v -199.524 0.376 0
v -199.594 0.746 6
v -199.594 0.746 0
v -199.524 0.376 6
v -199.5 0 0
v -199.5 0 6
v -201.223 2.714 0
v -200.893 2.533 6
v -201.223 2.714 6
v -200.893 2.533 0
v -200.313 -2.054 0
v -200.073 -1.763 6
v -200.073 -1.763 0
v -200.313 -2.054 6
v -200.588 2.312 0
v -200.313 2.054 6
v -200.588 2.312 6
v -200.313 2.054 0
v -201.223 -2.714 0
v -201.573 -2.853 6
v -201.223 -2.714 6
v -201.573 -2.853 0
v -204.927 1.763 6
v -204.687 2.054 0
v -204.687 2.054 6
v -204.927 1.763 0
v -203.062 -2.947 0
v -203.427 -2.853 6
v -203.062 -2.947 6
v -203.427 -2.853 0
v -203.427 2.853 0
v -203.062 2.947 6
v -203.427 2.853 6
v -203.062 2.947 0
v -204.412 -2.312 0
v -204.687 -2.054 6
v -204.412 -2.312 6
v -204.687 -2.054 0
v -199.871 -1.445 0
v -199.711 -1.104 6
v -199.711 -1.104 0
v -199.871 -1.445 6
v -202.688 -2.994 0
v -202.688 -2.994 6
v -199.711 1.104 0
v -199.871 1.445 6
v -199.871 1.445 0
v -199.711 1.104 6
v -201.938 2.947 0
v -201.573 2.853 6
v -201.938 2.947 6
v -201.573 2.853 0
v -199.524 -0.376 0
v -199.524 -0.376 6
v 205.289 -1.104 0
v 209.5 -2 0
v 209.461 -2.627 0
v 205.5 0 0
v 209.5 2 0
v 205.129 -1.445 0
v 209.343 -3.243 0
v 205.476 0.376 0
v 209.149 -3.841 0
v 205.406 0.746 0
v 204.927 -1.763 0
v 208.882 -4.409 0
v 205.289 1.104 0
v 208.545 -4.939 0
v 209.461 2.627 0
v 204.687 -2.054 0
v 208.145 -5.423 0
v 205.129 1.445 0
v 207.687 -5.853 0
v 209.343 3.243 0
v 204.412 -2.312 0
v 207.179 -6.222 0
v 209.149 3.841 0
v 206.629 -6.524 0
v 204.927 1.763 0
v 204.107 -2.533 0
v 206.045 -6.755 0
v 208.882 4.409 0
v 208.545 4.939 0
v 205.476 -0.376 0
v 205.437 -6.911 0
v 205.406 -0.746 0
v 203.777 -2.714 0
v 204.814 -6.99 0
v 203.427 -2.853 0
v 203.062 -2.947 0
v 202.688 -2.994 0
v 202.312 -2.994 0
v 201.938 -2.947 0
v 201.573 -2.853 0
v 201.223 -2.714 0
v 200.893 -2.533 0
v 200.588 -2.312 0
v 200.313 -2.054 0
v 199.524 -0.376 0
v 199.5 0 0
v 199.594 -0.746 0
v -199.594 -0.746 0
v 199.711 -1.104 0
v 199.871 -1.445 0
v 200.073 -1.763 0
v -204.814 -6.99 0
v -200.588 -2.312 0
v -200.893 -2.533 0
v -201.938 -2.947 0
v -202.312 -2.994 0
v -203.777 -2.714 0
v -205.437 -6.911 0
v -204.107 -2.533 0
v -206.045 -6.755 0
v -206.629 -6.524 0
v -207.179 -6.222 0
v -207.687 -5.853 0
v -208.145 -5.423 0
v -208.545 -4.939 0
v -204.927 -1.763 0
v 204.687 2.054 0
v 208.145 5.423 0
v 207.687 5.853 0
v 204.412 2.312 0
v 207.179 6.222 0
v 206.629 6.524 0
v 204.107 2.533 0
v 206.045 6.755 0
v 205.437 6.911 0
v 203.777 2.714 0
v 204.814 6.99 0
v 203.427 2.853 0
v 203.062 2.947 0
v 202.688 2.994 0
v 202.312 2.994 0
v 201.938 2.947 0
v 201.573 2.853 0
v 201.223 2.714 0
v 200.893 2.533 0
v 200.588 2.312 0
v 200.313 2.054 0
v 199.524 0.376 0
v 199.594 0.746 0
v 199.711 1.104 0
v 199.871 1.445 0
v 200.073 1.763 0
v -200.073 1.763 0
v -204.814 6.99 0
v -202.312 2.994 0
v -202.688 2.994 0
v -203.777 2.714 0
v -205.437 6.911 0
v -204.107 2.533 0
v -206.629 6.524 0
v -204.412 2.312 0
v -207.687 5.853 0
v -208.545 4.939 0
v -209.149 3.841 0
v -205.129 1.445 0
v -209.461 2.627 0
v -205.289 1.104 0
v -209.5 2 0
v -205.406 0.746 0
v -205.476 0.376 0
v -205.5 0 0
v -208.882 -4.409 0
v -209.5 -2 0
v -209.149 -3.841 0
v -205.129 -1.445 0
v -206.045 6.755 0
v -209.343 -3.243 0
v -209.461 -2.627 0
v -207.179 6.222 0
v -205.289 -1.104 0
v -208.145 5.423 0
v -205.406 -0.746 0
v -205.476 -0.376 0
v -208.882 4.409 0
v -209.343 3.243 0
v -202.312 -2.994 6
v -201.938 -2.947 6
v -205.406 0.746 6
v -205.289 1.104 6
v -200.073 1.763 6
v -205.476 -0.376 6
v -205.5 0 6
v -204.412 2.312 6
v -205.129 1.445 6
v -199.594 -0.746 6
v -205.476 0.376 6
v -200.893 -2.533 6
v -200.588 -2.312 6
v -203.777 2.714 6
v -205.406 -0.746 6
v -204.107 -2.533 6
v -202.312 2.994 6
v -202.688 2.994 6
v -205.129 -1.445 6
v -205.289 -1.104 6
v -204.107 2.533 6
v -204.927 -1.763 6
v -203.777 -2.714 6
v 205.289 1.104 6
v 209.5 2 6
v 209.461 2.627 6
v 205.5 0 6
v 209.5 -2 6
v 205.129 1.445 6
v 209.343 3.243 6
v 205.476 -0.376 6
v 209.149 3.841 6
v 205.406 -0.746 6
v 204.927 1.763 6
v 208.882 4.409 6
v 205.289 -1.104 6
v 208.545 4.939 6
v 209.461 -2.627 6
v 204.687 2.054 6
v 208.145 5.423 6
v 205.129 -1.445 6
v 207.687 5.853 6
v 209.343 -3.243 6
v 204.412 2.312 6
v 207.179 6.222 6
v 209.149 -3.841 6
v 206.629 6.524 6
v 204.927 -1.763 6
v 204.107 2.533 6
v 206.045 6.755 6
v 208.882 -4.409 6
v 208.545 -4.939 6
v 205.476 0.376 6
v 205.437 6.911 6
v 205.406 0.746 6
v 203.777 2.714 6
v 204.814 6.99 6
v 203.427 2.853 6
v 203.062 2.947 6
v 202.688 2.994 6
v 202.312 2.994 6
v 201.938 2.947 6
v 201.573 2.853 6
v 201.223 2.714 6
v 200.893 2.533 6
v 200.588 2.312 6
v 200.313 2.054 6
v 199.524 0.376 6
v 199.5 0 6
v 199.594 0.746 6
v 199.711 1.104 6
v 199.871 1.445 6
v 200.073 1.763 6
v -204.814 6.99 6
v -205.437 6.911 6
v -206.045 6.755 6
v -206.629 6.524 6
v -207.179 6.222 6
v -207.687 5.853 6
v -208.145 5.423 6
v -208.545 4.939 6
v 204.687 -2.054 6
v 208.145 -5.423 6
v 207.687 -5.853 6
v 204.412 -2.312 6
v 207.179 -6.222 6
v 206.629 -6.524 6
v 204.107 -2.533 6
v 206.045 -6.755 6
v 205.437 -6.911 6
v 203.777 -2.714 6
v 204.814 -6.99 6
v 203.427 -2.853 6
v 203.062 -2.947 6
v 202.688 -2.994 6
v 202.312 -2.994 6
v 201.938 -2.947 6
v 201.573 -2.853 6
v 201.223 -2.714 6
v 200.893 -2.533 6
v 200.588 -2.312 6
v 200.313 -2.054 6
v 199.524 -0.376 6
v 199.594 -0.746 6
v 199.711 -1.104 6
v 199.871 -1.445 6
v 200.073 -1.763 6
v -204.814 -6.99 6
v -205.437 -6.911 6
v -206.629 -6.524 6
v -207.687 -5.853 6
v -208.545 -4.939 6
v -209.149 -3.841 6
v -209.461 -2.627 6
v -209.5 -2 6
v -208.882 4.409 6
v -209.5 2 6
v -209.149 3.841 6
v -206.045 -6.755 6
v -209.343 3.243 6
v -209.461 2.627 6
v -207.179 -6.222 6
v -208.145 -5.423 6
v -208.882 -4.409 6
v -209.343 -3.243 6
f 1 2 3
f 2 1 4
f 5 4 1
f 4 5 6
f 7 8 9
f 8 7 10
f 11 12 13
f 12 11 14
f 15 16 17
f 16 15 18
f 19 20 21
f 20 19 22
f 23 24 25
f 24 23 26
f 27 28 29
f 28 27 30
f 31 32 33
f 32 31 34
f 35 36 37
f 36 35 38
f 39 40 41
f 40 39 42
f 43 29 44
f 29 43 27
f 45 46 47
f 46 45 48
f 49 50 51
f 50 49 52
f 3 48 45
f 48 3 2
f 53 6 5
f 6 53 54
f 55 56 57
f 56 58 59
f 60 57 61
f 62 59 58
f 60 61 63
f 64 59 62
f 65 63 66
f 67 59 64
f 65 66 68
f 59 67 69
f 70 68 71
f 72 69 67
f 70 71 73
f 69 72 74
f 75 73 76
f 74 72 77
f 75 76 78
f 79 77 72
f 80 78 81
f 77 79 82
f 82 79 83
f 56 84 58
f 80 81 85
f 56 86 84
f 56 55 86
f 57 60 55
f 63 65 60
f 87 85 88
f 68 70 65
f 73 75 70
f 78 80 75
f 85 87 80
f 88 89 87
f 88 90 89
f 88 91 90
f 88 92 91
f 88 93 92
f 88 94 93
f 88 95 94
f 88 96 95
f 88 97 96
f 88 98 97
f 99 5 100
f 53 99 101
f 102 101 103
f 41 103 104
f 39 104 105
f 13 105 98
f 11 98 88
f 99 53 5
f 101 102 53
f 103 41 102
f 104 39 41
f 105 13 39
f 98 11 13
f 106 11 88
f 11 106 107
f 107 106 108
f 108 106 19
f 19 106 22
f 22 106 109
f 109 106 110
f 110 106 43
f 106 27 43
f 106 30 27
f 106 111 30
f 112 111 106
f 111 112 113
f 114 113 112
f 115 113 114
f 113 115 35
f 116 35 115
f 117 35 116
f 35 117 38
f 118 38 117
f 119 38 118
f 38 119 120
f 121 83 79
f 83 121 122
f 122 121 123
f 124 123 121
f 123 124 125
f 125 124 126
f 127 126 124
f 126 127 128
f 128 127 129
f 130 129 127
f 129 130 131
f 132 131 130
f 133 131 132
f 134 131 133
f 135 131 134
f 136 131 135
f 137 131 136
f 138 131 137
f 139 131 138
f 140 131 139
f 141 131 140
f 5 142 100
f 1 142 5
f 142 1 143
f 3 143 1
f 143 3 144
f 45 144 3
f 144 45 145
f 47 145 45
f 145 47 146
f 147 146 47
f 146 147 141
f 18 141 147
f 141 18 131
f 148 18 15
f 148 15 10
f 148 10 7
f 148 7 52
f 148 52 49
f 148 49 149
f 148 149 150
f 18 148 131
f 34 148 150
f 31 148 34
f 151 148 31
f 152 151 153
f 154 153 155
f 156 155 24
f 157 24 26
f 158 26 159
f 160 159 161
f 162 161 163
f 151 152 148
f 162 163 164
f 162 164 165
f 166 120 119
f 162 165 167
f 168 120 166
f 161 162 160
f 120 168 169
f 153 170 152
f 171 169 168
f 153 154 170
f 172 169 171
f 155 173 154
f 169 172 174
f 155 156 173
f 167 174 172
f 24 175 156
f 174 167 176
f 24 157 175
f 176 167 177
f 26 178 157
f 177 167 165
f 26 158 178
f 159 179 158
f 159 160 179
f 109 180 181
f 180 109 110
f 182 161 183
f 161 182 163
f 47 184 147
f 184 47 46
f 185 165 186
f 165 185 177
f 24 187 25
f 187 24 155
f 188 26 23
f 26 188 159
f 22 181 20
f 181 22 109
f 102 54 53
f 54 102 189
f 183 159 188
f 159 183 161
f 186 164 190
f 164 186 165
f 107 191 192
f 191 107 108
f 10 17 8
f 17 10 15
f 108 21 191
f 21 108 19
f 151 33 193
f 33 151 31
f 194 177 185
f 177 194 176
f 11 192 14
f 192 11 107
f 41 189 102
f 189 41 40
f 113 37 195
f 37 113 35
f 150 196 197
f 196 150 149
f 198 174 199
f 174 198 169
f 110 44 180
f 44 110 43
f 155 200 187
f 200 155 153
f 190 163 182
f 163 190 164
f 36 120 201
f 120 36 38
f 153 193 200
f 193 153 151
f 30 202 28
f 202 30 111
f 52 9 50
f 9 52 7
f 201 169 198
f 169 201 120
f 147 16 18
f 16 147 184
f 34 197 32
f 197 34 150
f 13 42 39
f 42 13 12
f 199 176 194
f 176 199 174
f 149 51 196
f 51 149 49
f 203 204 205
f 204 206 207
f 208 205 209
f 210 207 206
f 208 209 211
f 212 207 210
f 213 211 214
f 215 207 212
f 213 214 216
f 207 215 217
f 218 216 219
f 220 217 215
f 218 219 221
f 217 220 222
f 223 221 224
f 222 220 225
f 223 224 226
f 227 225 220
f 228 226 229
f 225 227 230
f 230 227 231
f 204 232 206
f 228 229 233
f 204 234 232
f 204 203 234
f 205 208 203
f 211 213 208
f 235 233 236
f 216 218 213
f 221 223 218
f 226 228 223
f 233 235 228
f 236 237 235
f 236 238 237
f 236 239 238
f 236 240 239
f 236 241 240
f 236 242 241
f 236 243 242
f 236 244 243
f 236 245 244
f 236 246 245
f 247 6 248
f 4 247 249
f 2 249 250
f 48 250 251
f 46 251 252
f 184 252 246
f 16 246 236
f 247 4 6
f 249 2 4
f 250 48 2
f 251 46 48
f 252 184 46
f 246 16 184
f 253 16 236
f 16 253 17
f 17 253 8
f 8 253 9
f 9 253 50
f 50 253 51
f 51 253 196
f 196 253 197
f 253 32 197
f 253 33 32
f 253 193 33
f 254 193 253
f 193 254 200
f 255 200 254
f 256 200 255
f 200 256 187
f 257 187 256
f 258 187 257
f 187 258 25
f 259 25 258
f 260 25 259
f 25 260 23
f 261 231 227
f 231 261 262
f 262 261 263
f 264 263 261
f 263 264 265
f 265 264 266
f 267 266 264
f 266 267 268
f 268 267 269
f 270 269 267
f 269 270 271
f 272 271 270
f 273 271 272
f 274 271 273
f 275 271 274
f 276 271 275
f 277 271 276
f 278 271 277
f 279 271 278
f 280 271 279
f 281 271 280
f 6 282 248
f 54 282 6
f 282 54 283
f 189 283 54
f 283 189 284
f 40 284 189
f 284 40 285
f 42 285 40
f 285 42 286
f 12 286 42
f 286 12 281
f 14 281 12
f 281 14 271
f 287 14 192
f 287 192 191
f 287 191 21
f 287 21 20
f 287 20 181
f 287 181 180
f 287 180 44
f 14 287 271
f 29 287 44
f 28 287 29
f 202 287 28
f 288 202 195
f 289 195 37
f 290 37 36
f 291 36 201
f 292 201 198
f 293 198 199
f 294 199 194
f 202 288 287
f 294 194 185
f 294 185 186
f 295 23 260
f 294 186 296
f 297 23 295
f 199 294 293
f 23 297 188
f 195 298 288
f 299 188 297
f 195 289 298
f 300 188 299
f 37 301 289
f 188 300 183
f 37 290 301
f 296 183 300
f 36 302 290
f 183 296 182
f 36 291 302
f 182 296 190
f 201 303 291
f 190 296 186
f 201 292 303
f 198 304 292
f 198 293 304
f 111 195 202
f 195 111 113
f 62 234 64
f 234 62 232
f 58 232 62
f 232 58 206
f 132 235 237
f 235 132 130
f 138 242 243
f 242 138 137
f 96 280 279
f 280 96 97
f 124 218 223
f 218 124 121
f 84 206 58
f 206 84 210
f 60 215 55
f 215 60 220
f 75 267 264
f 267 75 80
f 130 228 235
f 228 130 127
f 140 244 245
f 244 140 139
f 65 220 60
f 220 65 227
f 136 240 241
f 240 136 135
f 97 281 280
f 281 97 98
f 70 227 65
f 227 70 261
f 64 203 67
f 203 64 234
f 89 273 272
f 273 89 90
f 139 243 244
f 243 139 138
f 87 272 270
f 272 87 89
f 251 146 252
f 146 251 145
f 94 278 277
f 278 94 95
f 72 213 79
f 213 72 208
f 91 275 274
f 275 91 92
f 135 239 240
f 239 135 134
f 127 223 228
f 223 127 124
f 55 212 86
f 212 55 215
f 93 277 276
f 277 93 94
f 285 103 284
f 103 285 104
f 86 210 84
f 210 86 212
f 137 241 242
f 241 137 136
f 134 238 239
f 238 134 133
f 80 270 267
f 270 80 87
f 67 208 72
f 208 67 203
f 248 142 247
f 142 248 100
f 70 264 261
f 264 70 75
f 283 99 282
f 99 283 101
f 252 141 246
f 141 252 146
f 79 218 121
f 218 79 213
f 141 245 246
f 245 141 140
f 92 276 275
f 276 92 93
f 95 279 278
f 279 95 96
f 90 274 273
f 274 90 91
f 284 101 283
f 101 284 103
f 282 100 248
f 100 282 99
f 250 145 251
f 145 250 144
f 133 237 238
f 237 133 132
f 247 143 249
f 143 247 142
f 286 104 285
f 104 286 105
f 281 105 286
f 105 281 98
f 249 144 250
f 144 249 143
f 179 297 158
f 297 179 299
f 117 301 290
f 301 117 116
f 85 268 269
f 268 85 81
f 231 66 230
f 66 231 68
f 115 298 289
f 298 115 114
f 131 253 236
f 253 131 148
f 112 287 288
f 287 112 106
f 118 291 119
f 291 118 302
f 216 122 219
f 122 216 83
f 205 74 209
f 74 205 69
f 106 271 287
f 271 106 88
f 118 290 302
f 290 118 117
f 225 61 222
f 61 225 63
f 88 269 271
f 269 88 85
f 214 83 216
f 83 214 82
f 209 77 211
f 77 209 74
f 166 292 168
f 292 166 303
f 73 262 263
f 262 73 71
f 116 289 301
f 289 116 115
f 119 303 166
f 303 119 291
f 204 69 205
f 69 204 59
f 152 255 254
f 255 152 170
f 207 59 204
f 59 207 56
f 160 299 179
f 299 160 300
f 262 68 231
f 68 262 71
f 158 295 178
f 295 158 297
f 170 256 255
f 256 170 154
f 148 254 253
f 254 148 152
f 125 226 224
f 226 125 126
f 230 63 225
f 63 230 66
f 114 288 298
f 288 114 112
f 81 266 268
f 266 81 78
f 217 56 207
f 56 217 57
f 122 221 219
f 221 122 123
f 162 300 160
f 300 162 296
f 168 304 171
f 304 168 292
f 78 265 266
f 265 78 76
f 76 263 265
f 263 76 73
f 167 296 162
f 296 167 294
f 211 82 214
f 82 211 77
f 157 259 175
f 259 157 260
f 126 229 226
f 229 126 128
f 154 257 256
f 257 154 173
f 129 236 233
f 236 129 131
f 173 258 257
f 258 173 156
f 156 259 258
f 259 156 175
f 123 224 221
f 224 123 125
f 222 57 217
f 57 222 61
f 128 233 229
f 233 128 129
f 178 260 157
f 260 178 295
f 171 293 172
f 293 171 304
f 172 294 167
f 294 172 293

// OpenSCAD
$fn = 50;


difference() {
	union() {
		hull() {
			translate(v = [-204.5000000000, 2.0000000000, 0]) {
				cylinder(h = 6, r = 5);
			}
			translate(v = [204.5000000000, 2.0000000000, 0]) {
				cylinder(h = 6, r = 5);
			}
			translate(v = [-204.5000000000, -2.0000000000, 0]) {
				cylinder(h = 6, r = 5);
			}
			translate(v = [204.5000000000, -2.0000000000, 0]) {
				cylinder(h = 6, r = 5);
			}
		}
	}
	union() {
		translate(v = [-202.5000000000, 0.0000000000, 0]) {
			cylinder(h = 6, r = 3.0000000000);
		}
		translate(v = [202.5000000000, 0.0000000000, 0]) {
			cylinder(h = 6, r = 3.0000000000);
		}
		translate(v = [-202.5000000000, 0.0000000000, 0]) {
			cylinder(h = 6, r = 1.5000000000);
		}
		translate(v = [202.5000000000, 0.0000000000, 0]) {
			cylinder(h = 6, r = 1.5000000000);
		}
		translate(v = [-202.5000000000, 0.0000000000, 0]) {
			cylinder(h = 6, r = 1.5000000000);
		}
		translate(v = [202.5000000000, 0.0000000000, 0]) {
			cylinder(h = 6, r = 1.5000000000);
		}
		translate(v = [-202.5000000000, 0.0000000000, 0]) {
			cylinder(h = 6, r = 1.5000000000);
		}
		translate(v = [202.5000000000, 0.0000000000, 0]) {
			cylinder(h = 6, r = 1.5000000000);
		}
	}
}
